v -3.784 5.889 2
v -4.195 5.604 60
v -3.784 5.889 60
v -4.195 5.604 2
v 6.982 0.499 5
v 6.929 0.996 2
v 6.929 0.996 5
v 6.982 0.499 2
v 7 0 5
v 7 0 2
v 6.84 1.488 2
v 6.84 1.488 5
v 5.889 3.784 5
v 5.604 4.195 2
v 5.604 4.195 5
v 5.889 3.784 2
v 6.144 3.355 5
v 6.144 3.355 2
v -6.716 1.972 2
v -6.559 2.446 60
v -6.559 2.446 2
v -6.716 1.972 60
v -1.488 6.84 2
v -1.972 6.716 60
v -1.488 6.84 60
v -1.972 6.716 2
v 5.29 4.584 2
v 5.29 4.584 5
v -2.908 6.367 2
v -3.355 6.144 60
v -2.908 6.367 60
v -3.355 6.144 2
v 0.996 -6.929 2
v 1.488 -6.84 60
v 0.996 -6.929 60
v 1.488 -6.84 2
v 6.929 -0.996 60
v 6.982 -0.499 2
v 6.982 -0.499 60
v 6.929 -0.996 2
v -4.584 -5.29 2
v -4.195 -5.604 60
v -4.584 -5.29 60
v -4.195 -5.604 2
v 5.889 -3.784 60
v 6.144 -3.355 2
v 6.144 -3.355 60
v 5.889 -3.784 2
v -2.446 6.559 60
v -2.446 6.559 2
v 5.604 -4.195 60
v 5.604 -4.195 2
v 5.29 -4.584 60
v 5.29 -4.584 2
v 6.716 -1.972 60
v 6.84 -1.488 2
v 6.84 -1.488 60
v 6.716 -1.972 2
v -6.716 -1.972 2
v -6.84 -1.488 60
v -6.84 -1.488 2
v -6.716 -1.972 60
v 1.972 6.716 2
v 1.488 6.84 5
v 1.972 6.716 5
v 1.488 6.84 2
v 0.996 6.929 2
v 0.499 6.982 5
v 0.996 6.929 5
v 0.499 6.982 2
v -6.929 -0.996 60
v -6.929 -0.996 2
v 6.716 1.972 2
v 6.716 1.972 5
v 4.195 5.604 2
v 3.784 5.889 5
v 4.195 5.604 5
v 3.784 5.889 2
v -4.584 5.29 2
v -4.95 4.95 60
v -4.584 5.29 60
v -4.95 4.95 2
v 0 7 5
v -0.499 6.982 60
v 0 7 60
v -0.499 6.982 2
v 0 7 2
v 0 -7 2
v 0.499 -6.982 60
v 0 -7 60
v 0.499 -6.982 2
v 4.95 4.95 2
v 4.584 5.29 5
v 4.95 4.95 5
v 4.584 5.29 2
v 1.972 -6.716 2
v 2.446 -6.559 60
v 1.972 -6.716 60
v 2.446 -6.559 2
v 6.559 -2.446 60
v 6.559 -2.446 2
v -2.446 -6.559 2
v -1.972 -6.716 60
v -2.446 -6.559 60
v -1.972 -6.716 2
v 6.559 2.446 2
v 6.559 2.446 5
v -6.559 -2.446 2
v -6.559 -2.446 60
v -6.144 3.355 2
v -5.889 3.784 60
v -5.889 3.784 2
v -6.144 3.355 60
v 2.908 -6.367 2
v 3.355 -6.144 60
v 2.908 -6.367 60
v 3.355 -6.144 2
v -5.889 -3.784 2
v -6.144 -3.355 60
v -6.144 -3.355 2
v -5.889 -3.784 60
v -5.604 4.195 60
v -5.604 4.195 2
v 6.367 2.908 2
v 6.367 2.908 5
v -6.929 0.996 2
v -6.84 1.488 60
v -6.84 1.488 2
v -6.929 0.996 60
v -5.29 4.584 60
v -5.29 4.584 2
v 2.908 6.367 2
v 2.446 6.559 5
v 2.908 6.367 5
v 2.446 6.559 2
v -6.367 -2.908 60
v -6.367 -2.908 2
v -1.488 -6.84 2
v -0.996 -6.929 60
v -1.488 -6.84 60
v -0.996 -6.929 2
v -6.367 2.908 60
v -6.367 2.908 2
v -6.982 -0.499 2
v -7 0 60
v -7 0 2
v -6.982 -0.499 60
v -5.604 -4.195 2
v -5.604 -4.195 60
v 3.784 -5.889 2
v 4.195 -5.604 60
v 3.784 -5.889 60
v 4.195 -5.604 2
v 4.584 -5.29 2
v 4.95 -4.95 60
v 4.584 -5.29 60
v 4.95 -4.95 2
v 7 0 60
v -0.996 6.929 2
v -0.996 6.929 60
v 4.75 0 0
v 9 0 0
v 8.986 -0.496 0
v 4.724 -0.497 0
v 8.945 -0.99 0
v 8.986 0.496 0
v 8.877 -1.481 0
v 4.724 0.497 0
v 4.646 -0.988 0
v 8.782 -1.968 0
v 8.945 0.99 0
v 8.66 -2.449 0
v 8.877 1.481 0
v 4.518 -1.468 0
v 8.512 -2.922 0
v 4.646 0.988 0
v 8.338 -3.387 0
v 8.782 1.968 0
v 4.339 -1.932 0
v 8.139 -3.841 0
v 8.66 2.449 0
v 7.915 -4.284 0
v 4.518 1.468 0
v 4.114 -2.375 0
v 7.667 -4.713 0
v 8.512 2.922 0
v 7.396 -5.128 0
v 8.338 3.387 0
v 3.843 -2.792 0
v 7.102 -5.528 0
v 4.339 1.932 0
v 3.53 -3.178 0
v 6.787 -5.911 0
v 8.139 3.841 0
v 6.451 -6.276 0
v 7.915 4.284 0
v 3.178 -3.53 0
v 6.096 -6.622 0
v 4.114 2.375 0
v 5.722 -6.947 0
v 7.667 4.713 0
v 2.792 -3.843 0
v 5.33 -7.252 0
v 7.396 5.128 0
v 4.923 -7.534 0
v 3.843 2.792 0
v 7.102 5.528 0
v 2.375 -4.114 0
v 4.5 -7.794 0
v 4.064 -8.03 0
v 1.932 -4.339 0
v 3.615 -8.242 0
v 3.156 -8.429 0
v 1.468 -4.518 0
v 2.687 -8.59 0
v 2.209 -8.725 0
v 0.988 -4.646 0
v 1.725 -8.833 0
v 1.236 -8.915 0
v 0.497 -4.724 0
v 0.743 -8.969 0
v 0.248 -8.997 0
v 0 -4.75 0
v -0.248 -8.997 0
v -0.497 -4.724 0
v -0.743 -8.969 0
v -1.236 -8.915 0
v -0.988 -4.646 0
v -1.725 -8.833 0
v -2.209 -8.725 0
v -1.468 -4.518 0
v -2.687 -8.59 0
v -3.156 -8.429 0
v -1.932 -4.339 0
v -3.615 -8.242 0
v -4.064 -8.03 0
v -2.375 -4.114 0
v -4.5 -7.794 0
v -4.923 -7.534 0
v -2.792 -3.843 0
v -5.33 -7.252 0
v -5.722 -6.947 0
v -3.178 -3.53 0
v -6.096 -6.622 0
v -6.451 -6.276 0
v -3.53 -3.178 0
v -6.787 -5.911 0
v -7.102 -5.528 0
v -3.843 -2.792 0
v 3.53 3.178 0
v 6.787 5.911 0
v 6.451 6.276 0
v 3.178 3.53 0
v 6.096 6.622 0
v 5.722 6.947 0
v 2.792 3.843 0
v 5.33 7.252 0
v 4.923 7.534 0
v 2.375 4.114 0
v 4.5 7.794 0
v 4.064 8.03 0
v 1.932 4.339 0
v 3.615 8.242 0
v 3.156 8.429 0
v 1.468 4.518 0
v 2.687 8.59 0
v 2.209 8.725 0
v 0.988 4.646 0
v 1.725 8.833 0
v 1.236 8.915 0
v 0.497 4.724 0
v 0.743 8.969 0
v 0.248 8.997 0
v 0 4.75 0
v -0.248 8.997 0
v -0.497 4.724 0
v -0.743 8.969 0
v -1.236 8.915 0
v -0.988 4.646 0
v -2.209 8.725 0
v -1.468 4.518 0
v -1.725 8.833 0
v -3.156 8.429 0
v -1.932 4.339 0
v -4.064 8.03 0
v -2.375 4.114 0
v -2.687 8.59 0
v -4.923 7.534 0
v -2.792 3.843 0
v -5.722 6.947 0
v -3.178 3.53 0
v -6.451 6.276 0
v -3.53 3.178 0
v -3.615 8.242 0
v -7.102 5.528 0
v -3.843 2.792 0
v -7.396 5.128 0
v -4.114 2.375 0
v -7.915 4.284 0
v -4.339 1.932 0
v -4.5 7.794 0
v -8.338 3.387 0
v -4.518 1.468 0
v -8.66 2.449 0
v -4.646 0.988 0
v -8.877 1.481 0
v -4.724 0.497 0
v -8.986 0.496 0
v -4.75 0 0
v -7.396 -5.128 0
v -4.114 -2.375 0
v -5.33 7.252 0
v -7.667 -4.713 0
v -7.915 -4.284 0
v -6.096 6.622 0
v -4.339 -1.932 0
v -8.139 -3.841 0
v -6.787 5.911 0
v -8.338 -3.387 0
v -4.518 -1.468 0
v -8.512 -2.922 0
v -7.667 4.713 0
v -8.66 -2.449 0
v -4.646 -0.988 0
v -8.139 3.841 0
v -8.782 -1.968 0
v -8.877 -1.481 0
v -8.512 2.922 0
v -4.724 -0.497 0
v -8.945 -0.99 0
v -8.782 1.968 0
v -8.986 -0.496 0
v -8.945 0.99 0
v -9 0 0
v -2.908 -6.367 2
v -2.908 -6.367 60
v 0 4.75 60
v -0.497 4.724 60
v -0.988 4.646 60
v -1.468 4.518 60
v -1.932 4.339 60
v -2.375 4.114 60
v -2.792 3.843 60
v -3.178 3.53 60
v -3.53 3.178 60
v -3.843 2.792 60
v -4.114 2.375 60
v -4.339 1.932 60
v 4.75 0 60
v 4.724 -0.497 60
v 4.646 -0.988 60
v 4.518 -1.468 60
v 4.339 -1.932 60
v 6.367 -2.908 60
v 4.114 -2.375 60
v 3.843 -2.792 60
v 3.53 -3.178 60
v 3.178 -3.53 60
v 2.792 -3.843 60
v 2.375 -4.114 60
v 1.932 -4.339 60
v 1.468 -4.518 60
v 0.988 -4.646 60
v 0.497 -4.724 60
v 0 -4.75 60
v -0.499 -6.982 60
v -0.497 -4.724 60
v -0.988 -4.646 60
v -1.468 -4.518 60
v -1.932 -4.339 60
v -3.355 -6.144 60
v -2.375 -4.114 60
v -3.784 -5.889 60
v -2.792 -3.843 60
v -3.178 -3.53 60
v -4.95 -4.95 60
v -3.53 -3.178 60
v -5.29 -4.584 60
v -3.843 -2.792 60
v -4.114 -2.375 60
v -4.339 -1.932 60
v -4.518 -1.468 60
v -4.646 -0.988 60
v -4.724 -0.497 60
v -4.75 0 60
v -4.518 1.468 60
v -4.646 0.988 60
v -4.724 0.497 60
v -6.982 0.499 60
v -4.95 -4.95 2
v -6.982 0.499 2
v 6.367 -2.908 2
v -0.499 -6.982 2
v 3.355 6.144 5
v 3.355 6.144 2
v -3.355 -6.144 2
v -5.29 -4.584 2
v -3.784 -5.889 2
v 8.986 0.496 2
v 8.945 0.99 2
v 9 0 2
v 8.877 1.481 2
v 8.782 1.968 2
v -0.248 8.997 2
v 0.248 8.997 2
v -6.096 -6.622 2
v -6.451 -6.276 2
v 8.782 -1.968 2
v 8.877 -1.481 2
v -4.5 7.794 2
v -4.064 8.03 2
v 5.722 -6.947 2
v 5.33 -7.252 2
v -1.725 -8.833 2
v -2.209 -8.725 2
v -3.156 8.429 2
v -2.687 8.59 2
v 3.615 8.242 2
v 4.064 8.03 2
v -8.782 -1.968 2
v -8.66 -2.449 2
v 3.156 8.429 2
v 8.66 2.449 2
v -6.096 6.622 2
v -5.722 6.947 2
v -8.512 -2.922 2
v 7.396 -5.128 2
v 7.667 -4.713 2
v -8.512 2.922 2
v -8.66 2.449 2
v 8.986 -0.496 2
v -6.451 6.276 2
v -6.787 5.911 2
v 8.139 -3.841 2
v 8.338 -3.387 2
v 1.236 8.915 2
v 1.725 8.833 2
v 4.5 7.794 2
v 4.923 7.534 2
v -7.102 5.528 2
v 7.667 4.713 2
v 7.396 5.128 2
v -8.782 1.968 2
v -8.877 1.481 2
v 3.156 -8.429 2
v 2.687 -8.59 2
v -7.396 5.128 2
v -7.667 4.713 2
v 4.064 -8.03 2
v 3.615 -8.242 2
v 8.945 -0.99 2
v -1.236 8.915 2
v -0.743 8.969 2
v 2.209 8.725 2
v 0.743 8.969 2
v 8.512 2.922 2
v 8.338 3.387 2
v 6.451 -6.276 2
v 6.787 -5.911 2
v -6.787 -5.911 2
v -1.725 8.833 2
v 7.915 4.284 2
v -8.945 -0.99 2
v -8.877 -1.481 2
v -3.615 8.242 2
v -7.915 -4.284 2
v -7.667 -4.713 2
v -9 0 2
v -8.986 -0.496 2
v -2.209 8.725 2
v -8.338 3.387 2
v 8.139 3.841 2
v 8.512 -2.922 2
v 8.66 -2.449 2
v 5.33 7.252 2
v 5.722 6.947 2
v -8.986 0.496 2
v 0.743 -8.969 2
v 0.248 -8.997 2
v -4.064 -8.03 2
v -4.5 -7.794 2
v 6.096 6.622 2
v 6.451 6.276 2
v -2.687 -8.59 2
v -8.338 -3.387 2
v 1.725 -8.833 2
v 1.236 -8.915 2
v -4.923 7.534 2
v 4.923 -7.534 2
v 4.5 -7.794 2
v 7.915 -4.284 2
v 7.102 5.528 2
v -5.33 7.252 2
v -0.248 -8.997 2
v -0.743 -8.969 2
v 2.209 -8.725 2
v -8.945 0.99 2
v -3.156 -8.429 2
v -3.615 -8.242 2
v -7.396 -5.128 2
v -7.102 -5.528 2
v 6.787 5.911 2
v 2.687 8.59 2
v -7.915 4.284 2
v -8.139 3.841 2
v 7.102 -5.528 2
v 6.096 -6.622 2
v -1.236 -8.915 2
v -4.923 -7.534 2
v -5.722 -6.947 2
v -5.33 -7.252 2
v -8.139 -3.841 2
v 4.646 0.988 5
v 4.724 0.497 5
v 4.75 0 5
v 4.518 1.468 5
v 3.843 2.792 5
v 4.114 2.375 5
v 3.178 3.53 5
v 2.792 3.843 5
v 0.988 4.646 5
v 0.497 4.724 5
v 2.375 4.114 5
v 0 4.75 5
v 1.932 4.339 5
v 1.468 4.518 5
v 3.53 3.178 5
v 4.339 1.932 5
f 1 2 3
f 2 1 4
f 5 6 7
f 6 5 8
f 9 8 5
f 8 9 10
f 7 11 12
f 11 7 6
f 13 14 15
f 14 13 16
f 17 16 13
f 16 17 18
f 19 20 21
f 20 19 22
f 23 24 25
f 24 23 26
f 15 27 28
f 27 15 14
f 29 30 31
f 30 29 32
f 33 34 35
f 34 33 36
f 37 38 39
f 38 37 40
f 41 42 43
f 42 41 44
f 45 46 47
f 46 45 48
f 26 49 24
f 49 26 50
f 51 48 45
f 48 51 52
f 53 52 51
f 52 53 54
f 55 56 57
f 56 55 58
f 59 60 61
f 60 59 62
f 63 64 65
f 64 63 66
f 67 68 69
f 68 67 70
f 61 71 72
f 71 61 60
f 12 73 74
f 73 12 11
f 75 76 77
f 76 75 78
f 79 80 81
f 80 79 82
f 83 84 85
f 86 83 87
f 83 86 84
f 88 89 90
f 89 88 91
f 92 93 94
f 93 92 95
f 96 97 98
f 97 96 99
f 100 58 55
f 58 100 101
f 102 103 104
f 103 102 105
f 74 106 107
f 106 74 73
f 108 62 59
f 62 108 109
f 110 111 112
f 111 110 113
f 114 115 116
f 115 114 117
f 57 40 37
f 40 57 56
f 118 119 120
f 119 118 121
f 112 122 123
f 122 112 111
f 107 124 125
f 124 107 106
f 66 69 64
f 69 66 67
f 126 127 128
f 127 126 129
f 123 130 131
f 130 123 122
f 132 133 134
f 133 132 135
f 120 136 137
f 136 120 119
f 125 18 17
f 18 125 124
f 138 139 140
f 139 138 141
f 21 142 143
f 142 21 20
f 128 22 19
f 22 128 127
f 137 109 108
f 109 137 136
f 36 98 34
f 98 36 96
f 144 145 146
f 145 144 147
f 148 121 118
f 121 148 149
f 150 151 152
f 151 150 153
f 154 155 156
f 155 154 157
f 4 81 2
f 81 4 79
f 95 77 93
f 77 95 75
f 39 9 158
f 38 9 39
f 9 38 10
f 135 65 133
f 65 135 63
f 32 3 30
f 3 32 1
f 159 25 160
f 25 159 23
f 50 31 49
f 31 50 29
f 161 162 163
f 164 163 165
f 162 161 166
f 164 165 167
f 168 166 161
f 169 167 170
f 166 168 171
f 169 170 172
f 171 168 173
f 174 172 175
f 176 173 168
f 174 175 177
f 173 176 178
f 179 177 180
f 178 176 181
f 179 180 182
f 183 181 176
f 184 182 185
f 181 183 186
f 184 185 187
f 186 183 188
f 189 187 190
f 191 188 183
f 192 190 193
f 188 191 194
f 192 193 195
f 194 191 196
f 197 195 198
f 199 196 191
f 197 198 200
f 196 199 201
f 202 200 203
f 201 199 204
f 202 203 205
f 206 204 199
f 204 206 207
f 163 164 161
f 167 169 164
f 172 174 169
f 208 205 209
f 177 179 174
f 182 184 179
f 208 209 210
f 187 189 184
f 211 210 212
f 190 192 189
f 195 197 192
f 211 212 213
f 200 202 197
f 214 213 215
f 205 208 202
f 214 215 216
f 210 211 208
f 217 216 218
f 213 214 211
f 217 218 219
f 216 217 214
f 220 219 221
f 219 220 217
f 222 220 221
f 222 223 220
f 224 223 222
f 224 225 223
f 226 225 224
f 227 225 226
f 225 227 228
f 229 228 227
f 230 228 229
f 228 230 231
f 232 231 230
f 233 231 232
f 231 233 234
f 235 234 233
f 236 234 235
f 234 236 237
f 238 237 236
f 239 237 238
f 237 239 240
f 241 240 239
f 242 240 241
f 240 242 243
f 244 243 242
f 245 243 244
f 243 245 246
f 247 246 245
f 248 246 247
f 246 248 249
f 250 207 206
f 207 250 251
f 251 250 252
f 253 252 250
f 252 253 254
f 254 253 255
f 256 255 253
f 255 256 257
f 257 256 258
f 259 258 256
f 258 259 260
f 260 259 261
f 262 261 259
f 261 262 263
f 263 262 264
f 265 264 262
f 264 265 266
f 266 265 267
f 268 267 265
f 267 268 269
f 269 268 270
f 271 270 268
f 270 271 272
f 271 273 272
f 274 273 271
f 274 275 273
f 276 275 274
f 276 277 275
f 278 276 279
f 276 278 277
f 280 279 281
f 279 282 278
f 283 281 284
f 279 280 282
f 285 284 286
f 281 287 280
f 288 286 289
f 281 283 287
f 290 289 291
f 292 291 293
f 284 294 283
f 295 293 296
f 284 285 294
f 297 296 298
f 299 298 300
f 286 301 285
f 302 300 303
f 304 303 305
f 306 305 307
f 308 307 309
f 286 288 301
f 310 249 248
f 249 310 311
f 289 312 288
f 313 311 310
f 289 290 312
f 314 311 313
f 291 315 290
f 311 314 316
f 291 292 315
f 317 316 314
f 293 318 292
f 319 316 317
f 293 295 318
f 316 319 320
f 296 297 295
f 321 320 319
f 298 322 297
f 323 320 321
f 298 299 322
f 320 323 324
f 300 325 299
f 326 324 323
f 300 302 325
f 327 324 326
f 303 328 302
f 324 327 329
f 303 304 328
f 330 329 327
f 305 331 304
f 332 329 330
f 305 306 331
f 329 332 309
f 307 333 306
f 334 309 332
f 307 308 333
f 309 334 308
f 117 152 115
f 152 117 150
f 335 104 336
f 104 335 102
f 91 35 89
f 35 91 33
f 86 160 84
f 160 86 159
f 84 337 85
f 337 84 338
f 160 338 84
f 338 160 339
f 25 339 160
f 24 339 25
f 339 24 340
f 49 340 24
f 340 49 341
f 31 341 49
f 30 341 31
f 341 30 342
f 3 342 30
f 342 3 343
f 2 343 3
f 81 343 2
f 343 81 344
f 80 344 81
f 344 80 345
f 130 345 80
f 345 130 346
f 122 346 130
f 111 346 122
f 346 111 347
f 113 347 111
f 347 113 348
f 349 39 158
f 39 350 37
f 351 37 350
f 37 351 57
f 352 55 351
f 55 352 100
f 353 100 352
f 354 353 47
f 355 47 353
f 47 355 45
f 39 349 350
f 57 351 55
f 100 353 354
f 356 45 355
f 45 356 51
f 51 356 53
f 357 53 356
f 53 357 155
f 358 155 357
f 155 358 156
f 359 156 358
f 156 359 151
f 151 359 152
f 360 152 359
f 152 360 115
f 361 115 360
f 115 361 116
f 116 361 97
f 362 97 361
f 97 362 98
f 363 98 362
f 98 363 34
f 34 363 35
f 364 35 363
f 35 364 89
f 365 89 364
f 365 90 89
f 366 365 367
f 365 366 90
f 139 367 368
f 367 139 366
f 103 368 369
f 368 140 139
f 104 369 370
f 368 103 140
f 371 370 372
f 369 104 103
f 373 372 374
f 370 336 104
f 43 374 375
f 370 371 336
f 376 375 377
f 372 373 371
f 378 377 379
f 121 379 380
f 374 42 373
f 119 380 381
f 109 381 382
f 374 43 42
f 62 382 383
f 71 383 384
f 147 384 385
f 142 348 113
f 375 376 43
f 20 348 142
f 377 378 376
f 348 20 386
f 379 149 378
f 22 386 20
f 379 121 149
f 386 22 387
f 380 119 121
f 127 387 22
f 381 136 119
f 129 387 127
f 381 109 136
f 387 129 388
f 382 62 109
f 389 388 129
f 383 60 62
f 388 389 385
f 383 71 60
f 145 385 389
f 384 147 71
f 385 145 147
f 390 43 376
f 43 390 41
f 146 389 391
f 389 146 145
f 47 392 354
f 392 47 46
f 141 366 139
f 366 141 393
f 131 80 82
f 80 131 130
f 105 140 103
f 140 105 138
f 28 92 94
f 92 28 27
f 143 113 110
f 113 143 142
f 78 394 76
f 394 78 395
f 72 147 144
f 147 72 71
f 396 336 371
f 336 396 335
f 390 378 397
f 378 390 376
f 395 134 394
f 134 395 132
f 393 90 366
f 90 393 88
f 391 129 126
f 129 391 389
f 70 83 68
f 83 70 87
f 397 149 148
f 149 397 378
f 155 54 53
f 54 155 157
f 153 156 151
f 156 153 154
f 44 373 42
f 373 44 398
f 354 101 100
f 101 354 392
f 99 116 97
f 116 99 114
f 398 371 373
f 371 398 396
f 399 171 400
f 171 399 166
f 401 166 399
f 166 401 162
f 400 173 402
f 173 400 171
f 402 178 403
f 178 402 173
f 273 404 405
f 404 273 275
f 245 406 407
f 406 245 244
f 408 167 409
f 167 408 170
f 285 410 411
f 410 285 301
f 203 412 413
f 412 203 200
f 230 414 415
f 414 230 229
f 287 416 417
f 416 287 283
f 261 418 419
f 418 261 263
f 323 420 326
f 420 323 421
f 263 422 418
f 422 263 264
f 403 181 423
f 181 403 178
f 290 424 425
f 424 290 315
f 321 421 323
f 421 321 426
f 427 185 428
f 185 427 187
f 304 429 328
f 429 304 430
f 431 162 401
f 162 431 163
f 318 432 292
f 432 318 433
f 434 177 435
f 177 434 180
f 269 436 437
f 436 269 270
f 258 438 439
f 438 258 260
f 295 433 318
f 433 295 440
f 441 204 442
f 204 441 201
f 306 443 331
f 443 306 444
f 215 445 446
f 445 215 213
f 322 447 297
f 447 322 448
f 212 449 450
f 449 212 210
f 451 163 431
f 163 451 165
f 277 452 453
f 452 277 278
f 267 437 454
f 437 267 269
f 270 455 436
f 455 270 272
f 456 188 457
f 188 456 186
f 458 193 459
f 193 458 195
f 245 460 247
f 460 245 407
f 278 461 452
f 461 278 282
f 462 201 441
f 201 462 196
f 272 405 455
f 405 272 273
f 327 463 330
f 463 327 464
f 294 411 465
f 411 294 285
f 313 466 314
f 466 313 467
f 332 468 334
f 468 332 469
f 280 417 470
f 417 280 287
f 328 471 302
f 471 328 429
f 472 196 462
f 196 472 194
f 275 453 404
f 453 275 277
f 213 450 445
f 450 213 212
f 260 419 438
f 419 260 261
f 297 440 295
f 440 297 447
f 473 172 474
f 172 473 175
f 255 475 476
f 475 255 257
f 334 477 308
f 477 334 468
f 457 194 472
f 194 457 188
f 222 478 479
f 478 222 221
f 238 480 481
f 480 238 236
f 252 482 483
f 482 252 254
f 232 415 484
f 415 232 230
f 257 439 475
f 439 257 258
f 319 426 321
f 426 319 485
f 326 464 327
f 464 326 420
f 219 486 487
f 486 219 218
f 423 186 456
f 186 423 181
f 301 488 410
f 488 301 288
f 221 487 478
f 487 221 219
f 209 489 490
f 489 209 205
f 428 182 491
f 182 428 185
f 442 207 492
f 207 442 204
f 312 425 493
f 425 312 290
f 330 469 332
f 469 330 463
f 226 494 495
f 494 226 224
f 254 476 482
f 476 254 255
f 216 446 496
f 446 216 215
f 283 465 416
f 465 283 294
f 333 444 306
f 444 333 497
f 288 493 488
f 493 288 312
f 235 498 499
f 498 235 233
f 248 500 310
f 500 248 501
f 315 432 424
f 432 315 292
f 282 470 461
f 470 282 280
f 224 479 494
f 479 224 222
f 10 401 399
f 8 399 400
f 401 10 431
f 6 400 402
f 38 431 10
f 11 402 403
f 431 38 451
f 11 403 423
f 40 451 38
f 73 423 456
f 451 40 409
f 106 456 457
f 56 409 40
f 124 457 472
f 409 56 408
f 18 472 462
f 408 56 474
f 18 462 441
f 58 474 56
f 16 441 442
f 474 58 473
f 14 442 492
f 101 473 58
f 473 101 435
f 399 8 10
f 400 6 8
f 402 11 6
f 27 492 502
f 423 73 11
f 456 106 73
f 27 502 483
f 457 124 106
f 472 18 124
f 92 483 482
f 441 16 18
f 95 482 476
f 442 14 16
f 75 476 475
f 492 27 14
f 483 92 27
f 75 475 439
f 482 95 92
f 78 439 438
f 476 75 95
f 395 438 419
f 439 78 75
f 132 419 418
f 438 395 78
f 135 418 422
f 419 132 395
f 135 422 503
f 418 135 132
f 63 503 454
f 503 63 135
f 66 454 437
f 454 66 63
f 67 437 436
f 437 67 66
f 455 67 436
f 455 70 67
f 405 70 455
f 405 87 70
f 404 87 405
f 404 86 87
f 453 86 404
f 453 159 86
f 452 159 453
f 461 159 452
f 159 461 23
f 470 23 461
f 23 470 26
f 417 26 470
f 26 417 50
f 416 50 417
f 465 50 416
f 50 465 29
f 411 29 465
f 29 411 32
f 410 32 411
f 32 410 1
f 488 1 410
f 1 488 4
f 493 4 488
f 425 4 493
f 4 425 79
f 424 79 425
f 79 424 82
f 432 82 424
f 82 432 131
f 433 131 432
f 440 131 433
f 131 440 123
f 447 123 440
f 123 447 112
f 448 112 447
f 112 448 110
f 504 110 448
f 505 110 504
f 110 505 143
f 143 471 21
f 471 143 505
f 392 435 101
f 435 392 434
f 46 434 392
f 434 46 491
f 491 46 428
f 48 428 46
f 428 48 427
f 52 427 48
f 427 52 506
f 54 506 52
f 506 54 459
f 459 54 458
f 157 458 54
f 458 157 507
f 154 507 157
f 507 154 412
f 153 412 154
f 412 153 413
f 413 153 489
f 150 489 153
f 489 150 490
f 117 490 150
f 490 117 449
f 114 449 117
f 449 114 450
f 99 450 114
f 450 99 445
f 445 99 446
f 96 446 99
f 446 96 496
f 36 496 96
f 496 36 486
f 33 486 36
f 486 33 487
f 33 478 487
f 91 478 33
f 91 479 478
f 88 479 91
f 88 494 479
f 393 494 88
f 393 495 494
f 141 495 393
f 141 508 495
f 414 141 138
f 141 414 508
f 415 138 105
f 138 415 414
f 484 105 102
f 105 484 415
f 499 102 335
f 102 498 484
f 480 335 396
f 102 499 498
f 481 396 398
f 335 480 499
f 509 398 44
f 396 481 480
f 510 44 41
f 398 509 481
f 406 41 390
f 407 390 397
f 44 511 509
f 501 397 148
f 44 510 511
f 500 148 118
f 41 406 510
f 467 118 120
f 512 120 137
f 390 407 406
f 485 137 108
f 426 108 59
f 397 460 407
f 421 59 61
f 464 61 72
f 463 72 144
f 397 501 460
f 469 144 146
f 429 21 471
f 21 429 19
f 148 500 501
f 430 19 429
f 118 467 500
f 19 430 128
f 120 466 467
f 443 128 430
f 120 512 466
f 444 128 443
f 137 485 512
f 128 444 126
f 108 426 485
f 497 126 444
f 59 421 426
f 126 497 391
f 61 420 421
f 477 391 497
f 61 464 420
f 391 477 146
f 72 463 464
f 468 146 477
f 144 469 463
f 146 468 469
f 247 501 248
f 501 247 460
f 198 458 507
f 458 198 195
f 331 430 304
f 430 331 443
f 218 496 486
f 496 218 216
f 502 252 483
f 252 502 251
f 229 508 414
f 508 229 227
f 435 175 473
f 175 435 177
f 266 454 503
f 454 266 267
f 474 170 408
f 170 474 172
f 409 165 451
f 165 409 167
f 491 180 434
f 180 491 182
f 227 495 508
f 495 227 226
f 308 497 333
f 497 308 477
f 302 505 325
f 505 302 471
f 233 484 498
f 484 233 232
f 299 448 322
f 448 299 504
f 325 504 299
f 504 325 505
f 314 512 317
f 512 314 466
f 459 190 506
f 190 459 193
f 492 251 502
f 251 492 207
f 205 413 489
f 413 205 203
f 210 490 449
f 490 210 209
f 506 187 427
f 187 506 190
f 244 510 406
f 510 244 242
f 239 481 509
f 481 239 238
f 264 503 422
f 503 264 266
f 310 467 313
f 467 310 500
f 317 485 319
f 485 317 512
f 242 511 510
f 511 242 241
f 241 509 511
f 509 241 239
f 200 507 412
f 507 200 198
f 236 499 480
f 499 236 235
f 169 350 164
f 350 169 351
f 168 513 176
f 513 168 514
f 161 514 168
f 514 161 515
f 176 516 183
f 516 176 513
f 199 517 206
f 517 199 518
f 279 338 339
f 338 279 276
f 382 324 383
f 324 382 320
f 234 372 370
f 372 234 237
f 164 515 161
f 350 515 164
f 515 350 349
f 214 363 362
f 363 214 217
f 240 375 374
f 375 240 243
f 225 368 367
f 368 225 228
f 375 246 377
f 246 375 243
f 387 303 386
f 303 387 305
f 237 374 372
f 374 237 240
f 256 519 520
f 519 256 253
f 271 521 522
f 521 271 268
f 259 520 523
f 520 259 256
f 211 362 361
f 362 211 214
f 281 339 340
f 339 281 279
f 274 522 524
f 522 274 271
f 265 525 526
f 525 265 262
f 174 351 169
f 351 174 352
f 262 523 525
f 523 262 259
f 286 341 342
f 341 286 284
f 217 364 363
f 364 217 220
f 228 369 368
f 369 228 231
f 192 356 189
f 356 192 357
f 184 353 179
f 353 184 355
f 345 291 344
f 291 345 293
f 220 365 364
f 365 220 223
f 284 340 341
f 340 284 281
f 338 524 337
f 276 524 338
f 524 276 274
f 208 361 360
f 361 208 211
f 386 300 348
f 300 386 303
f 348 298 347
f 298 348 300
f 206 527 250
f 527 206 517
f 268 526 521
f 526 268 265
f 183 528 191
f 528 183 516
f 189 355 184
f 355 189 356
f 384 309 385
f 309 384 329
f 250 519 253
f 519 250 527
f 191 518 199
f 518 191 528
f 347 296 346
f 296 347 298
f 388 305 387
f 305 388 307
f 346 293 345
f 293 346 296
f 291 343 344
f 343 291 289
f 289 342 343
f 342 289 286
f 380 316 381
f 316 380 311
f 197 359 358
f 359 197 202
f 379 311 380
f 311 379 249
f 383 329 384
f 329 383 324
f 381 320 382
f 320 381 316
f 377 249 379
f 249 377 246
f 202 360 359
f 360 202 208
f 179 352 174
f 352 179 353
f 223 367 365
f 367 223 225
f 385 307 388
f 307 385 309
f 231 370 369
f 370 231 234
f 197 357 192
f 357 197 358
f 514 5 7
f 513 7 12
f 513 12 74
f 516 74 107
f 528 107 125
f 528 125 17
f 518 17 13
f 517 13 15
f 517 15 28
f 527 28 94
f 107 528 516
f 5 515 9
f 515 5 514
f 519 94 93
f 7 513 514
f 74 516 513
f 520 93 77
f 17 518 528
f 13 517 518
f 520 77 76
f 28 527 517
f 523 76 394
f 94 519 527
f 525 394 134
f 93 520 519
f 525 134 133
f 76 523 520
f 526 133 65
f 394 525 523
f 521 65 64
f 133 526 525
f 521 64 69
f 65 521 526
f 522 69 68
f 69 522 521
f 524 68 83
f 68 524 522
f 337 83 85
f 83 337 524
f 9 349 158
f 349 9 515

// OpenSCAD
//syringe adaptors for pumps with a 14mm diameter cut-out
// r of our syringes are:
//Hamilton 200uL/500uL: OD 7.75; (r=3.875)
//1mL plastic: OD 7mm
//ring for 5mL BD: 14.75mm (fits into default part but neets 5mm ring)
//sge glass 100 & 250micL r=4.5+0.25
//default length of connector: 60mm

//variables
length_syringe=60; //put in desired length of the part (might depend on syringe)
syringe_r=4.5 +0.25; //radius of the syringe in question + material/3D-printer dependent addition for easy fit (here 0.5mm), 

cutout_r=7; //radius of the cut-out in the 'syringe-part' of the pump = outer cylinder of part, here 7

fix_r=cutout_r+2; //feature to fix connector (add 2mm)
fix_h=2;

rim=10; //length of plastic all around
//model

difference ()
{
    translate ([0,0,0]) 
    rotate ([0,0,0])
    union ()
        {
            cylinder(r = cutout_r, h = length_syringe, $fa=1, $fs=0.5);
            cylinder(r = fix_r, h = fix_h, $fa=1, $fs=0.5);
        }
        
    cylinder(r = syringe_r, h = 4*length_syringe, $fa=1, $fs=0.5, center=true);
    translate ([0,0,rim/2])    
    cube ([2*syringe_r, 2*syringe_r, length_syringe]);
}
